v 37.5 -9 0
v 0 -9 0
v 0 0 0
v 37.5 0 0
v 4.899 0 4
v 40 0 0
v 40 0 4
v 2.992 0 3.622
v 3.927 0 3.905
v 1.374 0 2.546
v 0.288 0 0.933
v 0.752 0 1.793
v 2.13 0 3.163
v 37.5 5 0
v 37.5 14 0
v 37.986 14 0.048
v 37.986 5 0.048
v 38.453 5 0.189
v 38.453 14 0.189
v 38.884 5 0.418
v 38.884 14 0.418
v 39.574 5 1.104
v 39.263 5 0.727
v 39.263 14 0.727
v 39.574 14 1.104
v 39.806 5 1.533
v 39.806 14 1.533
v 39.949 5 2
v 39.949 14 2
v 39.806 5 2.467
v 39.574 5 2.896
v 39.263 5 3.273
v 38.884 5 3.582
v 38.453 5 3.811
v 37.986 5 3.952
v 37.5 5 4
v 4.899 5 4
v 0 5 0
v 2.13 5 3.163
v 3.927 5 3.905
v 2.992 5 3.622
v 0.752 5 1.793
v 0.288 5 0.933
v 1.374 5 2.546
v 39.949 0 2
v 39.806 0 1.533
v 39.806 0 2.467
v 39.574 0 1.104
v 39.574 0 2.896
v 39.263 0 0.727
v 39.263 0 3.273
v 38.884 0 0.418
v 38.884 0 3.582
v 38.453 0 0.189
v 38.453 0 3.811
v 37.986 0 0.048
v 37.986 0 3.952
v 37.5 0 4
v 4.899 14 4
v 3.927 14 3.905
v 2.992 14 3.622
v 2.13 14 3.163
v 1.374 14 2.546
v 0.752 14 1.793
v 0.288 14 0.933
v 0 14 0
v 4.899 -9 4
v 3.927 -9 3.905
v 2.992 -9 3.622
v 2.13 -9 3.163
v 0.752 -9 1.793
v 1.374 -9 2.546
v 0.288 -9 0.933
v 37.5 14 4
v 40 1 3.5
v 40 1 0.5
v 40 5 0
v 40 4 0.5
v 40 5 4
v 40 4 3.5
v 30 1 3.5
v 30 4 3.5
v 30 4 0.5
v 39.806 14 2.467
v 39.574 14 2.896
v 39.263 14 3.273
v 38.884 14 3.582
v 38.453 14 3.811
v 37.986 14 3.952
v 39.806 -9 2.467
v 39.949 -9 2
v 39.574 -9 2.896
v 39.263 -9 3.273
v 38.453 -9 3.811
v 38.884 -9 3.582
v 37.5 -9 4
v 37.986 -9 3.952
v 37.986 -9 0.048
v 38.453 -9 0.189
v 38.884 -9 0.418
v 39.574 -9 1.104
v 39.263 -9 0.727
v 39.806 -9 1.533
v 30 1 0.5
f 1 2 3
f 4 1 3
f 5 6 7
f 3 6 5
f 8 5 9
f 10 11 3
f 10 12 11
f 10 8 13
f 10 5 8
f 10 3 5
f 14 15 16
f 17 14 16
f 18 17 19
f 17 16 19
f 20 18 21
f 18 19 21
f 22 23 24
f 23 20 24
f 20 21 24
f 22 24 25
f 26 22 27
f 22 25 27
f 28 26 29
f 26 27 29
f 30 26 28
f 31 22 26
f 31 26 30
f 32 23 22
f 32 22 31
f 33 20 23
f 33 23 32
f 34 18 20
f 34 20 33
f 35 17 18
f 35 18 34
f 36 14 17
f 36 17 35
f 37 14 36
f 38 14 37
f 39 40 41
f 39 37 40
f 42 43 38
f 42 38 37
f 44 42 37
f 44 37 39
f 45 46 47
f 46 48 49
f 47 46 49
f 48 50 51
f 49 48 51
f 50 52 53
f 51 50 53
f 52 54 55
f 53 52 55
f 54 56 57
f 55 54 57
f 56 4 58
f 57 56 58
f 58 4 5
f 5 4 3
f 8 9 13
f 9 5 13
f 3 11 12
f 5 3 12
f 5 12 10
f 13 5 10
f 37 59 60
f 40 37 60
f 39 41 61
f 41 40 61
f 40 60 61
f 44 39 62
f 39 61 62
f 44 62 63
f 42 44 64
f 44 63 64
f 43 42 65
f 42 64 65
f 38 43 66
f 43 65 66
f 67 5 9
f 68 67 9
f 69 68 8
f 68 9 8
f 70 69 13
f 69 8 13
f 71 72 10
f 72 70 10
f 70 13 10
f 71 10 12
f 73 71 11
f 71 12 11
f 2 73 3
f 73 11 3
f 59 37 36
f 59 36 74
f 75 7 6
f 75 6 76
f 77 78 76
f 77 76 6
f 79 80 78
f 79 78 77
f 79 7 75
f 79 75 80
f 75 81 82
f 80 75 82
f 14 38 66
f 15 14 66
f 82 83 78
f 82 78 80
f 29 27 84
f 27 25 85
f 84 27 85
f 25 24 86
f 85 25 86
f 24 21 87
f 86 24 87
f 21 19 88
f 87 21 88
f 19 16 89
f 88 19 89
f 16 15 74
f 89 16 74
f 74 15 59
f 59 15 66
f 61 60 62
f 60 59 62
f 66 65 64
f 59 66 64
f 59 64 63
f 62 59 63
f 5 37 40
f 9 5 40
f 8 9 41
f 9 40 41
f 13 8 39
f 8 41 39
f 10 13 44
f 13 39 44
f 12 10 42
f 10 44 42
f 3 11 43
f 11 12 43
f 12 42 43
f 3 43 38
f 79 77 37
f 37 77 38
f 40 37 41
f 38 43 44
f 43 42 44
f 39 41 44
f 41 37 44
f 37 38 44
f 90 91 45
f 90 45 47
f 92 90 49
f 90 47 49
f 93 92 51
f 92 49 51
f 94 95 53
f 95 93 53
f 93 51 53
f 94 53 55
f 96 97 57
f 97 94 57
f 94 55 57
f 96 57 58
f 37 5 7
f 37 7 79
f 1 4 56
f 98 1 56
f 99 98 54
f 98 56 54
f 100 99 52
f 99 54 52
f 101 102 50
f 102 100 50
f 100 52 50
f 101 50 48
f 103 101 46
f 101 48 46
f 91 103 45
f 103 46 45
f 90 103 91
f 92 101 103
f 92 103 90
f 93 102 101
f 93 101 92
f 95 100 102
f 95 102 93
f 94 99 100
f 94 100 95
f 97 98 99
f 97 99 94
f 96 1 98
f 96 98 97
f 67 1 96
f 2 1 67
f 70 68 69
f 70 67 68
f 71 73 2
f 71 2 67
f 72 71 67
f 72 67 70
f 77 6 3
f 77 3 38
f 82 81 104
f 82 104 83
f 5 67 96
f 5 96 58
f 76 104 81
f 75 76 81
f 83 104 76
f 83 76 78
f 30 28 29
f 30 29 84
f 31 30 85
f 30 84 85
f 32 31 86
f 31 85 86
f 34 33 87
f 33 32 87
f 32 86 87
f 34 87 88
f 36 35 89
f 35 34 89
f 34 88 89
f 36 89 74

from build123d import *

# Parameters (mm, degrees)
F0_W          = 9
F0_H          = 4
F1_DEPTH      = 40
F0_W_2        = 5
F2_DEPTH      = 40
F3_W          = 3
F3_H          = 3
F4_DEPTH      = 10
F5_T1_DEPTH   = 33.4948974279
F5_2_T1_DEPTH = 33.4948974279
F5_3_T1_DEPTH = 29.4948974279
F6_T1_DEPTH   = 21.5
F6_2_T1_DEPTH = 21.5


# Not quite as in the source:
# - a fillet or chamfer that OpenCascade refuses, or shapes differently, is made with other operations: its cross-section is extruded or revolved along the edge and cut away or added


with BuildPart() as f1:
    # F0 (on Right) → F1 (new body)
    with BuildSketch(Plane.YZ):
        with Locations((-4.5, 2)):
            Rectangle(F0_W, F0_H)
    extrude(amount=F1_DEPTH)

    # F5: fillet of radius 5 on 1 edges, made by hand

    # F5_s2 → F5_t1 (cut)
    with BuildSketch(Plane.XZ.offset(-12.2474487139)):
        with BuildLine():
            ThreePointArc((4.8989794856, 4), (1.7367018254, 2.8729833462), (0, 0))
            Line((0, 0), (0, 4))
            Line((0, 4), (4.8989794856, 4))
        make_face()
    extrude(amount=F5_T1_DEPTH, mode=Mode.SUBTRACT)

    # F6: fillet of radius 2.5 on 2 edges, made by hand

    # F6_s2 → F6_t1 (cut)
    with BuildSketch(Plane.XZ.offset(-6.25)):
        with BuildLine():
            ThreePointArc((40, 1.5), (39.267766953, 3.267766953), (37.5, 4))
            Line((37.5, 4), (40, 4))
            Line((40, 4), (40, 1.5))
        make_face()
        with BuildLine():
            ThreePointArc((37.5, 0), (39.267766953, 0.732233047), (40, 2.5))
            Line((40, 2.5), (40, 0))
            Line((40, 0), (37.5, 0))
        make_face()
    extrude(amount=F6_T1_DEPTH, mode=Mode.SUBTRACT)


with BuildPart() as f1b:
    # F0 (on Right) → F1, piece 2 (new body)
    with BuildSketch(Plane.YZ):
        with Locations((9.5, 2)):
            Rectangle(F0_W, F0_H)
    extrude(amount=F1_DEPTH)

    # F5#2: fillet of radius 5 on 1 edges, made by hand

    # F5_2_s2 → F5_2_t1 (cut)
    with BuildSketch(Plane.XZ.offset(-26.2474487139)):
        with BuildLine():
            ThreePointArc((4.8989794856, 4), (1.7367018254, 2.8729833462), (0, 0))
            Line((0, 0), (0, 4))
            Line((0, 4), (4.8989794856, 4))
        make_face()
    extrude(amount=F5_2_T1_DEPTH, mode=Mode.SUBTRACT)

    # F6#2: fillet of radius 2.5 on 2 edges, made by hand

    # F6_2_s2 → F6_2_t1 (cut)
    with BuildSketch(Plane.XZ.offset(-20.25)):
        with BuildLine():
            ThreePointArc((40, 1.5), (39.267766953, 3.267766953), (37.5, 4))
            Line((37.5, 4), (40, 4))
            Line((40, 4), (40, 1.5))
        make_face()
        with BuildLine():
            ThreePointArc((37.5, 0), (39.267766953, 0.732233047), (40, 2.5))
            Line((40, 2.5), (40, 0))
            Line((40, 0), (37.5, 0))
        make_face()
    extrude(amount=F6_2_T1_DEPTH, mode=Mode.SUBTRACT)


with BuildPart() as f2:
    # F0 (on Right) → F2 (new body)
    with BuildSketch(Plane.YZ):
        with Locations((2.5, 2)):
            Rectangle(F0_W_2, F0_H)
    extrude(amount=F2_DEPTH)

    # F3 (on face) → F4 (cut)
    with BuildSketch(Plane.YZ.offset(40)):
        with Locations((2.5, 2)):
            Rectangle(F3_W, F3_H)
    extrude(amount=-F4_DEPTH, mode=Mode.SUBTRACT)

    # F5#3: fillet of radius 5 on 1 edges, made by hand

    # F5_3_s2 → F5_3_t1 (cut)
    with BuildSketch(Plane.XZ.offset(-17.2474487139)):
        with BuildLine():
            ThreePointArc((4.8989794856, 4), (1.7367018254, 2.8729833462), (0, 0))
            Line((0, 0), (0, 4))
            Line((0, 4), (4.8989794856, 4))
        make_face()
    extrude(amount=F5_3_T1_DEPTH, mode=Mode.SUBTRACT)


solid = Compound([f1.part, f1b.part, f2.part])
